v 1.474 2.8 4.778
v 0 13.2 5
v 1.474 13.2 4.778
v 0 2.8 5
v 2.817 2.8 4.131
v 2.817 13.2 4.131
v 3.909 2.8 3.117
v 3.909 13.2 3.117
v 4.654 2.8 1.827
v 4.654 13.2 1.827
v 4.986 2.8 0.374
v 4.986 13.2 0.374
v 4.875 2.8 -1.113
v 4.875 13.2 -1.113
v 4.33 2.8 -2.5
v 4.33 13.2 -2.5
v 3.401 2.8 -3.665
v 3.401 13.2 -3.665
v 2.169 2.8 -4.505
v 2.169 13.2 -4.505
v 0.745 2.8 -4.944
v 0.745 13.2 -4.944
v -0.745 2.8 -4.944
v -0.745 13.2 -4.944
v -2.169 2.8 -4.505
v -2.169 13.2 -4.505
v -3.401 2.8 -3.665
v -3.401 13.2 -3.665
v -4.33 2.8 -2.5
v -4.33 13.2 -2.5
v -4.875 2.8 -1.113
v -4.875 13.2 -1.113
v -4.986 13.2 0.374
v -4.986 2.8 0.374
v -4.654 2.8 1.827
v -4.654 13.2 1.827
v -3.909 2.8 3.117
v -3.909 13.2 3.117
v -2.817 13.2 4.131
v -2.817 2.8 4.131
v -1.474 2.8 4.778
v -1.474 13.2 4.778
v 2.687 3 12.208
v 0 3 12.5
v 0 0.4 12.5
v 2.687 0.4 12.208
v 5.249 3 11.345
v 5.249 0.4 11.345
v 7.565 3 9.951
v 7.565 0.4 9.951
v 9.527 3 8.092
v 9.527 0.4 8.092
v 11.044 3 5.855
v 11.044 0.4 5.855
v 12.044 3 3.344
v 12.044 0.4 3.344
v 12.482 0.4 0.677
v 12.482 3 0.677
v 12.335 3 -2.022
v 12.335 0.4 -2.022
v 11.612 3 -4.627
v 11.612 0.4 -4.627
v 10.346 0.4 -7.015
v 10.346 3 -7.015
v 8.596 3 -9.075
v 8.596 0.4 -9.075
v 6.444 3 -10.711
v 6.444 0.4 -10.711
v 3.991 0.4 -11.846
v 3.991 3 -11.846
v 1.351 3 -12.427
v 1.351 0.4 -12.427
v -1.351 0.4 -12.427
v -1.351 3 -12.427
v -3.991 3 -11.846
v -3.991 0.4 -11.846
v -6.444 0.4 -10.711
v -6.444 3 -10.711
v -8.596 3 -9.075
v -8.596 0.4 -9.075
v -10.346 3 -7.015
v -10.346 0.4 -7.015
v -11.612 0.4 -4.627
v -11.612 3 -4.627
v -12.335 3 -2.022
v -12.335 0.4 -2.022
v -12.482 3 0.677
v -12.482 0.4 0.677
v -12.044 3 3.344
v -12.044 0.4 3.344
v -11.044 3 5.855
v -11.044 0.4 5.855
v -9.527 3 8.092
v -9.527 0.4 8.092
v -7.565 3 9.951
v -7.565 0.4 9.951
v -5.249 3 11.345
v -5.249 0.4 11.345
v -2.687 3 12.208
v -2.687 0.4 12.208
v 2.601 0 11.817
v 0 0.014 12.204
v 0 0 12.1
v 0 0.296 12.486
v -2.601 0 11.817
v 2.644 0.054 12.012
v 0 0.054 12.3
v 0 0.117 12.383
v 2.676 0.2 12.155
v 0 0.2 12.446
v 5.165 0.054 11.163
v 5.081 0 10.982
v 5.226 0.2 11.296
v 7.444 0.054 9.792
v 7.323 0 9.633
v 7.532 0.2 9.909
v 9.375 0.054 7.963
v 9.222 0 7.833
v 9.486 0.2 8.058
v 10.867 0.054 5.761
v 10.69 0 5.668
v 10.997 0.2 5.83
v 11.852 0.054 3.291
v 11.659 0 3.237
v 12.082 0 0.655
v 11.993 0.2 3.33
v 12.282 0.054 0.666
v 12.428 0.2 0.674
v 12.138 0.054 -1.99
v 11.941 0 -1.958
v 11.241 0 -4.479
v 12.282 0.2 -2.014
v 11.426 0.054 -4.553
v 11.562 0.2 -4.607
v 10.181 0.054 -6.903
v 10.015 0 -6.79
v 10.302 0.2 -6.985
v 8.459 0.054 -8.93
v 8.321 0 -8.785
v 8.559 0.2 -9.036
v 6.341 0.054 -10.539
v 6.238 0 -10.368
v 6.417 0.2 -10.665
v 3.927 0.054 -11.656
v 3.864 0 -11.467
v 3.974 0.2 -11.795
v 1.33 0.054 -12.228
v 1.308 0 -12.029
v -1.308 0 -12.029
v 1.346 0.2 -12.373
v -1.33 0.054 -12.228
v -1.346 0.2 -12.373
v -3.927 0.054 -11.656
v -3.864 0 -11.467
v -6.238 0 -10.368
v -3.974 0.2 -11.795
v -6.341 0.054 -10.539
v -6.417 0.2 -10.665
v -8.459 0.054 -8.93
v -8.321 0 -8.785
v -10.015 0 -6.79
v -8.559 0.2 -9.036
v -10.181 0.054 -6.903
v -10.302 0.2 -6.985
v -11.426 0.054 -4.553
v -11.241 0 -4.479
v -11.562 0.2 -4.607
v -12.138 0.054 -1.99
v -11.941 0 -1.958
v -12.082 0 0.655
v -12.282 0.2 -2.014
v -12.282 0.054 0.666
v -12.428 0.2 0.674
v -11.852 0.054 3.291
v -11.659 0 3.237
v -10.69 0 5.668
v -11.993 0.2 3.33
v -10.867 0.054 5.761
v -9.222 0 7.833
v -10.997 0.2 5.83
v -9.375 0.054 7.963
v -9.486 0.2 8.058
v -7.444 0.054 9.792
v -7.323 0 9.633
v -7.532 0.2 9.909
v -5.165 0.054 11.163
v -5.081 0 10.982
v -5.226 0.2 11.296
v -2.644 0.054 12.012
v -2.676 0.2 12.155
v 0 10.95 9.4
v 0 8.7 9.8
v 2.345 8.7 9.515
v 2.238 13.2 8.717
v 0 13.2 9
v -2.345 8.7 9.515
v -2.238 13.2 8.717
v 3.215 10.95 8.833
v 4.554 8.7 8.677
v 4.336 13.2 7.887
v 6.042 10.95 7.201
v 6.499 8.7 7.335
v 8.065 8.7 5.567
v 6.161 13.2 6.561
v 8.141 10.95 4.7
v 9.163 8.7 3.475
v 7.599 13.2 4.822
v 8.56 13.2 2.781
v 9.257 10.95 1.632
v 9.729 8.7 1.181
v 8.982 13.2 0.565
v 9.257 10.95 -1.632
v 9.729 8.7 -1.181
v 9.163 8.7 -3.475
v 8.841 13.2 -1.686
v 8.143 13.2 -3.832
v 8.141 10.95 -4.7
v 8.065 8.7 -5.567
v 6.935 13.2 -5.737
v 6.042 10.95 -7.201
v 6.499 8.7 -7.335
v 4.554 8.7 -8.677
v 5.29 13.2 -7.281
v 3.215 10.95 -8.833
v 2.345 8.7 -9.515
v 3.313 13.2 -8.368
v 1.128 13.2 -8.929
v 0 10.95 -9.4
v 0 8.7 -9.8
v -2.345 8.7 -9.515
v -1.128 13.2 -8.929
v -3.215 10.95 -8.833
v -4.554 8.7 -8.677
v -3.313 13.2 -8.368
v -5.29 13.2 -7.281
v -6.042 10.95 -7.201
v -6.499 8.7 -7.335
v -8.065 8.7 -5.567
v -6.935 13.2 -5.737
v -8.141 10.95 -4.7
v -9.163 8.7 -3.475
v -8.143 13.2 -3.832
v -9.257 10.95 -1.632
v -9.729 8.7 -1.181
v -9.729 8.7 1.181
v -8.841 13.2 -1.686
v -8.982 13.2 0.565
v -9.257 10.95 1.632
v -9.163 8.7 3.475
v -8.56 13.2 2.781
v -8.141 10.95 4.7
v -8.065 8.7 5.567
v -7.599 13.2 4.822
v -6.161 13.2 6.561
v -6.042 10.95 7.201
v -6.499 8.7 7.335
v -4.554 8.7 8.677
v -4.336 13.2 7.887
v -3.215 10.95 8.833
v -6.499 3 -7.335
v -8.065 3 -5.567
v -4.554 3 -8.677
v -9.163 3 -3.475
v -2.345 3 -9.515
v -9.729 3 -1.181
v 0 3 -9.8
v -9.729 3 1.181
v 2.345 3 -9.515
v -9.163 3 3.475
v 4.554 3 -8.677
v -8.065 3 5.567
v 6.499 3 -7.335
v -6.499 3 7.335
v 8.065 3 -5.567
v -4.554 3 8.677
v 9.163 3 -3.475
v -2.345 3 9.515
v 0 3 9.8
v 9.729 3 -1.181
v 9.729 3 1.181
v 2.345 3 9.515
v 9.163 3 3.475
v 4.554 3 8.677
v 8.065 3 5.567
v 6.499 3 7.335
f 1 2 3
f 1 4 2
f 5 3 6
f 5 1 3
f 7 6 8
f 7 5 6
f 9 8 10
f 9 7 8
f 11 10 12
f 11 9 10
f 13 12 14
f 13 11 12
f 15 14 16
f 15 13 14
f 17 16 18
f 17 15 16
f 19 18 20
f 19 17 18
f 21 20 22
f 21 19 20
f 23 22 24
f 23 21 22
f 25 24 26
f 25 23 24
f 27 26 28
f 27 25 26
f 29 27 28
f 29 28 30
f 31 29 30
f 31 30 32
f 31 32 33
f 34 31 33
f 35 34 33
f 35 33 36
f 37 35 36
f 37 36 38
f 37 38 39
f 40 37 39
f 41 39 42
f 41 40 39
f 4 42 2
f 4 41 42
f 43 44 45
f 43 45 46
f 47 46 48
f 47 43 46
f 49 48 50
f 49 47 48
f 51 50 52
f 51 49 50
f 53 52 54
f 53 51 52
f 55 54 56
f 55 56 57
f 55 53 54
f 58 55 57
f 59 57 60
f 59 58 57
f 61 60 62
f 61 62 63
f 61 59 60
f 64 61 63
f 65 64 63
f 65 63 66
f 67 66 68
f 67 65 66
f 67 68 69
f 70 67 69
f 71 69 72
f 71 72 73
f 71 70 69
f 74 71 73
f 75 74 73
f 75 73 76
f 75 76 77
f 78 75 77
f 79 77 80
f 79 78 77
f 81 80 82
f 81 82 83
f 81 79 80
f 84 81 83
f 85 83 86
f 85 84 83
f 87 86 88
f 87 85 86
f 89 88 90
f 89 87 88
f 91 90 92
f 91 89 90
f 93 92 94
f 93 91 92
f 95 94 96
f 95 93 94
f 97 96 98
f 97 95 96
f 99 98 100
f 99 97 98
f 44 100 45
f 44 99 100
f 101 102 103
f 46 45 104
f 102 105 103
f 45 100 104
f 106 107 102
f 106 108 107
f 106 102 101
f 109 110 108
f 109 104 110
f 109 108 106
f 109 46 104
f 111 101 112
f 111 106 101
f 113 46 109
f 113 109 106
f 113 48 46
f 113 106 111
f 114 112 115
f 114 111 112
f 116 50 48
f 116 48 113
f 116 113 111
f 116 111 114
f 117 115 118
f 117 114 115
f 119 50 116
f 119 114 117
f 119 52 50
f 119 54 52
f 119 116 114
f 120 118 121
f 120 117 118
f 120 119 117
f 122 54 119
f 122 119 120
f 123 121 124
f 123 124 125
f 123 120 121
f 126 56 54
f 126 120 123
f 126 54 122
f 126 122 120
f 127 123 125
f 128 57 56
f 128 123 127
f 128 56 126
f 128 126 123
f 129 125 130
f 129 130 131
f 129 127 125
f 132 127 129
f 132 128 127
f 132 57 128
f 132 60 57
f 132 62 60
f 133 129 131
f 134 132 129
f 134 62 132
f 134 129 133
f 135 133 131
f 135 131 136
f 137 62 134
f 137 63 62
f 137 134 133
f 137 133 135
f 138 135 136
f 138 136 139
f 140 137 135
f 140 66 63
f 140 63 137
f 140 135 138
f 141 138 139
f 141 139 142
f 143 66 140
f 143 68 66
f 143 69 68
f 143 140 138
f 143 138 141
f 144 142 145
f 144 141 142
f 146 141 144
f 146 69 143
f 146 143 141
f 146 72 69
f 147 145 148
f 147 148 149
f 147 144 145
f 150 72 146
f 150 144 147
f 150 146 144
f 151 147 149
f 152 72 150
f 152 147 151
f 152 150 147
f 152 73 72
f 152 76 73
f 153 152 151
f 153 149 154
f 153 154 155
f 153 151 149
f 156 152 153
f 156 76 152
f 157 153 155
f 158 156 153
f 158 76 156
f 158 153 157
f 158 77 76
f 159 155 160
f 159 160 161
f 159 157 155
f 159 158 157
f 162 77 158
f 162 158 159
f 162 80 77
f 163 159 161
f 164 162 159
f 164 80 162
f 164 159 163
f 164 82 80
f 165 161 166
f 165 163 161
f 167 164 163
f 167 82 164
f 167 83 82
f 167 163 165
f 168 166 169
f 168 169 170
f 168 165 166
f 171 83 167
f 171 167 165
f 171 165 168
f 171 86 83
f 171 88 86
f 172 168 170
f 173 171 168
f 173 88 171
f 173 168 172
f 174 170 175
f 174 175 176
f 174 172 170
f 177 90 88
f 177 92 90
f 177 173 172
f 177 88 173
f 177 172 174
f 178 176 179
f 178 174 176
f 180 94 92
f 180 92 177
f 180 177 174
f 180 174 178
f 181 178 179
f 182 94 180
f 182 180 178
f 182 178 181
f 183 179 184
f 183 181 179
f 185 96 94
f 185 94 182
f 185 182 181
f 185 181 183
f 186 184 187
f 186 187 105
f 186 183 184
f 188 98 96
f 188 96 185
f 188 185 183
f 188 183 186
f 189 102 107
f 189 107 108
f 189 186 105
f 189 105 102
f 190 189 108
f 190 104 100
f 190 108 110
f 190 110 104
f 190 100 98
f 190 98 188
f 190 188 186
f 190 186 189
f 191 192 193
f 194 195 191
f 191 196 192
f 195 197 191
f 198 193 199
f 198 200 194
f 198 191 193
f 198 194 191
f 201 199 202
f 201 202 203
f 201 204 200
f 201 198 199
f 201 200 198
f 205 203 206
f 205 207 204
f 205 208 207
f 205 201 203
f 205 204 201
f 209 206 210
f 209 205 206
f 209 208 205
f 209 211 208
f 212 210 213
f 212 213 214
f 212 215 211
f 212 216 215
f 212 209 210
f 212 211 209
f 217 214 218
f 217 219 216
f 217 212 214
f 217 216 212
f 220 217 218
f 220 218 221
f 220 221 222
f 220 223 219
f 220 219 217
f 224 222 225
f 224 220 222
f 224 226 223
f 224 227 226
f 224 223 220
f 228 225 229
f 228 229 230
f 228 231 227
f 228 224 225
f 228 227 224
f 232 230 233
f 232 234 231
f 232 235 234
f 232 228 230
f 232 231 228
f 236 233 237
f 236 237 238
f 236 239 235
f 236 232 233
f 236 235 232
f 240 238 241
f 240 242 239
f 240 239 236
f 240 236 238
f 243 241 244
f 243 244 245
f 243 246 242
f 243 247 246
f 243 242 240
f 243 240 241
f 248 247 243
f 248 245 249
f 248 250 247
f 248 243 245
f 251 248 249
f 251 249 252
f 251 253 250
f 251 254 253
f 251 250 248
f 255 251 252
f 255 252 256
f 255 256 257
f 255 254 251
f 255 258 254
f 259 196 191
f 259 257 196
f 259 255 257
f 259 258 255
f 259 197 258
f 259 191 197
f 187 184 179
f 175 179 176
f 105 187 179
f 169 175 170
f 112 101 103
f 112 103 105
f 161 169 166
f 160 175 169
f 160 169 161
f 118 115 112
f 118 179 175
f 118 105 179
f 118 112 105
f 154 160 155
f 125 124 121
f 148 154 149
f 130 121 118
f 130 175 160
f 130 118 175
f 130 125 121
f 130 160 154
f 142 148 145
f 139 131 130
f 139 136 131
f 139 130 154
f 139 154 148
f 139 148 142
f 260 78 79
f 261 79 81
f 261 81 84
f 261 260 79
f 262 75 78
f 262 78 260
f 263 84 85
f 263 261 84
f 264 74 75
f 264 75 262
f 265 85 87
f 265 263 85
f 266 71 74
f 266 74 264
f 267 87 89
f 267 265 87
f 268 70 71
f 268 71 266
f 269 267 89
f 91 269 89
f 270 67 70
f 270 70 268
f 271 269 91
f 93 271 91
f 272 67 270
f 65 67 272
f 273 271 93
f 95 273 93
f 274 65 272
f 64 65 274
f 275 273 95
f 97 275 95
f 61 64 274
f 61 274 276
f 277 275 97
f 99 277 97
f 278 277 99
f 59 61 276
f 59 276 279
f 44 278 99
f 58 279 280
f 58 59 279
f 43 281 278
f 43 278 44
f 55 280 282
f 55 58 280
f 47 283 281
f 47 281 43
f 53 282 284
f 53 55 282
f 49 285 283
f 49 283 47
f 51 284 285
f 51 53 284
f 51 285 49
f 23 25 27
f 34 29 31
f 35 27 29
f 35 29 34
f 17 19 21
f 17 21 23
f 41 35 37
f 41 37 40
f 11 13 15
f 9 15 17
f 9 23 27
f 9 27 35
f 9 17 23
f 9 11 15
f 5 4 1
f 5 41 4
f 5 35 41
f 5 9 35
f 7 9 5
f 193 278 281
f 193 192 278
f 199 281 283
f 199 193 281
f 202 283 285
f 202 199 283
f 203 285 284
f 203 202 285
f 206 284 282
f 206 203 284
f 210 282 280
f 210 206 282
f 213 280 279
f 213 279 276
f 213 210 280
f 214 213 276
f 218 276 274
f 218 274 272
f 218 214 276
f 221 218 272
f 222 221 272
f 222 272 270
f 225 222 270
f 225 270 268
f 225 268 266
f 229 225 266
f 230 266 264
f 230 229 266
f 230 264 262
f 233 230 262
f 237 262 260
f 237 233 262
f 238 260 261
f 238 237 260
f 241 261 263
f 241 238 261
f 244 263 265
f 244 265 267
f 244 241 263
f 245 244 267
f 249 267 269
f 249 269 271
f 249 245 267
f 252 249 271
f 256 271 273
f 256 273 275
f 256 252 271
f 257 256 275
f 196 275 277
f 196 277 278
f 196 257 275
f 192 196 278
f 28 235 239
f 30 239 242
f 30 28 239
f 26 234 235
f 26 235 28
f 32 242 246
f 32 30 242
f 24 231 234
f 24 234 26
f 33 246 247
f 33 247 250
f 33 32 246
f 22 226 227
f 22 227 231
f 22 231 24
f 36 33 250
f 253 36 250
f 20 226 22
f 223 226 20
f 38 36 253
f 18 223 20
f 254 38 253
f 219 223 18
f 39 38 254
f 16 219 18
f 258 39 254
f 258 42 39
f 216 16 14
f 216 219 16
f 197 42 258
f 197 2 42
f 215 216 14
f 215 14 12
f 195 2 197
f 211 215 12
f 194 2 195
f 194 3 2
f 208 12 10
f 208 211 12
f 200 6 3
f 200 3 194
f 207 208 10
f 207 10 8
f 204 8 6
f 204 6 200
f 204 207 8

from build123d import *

# Parameters (mm, degrees)
FILLET1_R = 0.4


with BuildPart() as part:
    # Sketch1 → Revolve1 (revolve)
    with BuildSketch(Plane(origin=(0, 0, 0), x_dir=(0, 0, -1), z_dir=(1, 0, 0))):
        Polygon((0, 0), (-12.5, 0), (-12.5, 3), (-9.8, 3), (-9.8, 8.7), (-9, 13.2), (-5, 13.2), (-5, 2.8), (0, 2.8), align=None)
    revolve(axis=Axis((0, 0, 0), (0, 1, 0)))

    # Fillet1
    fillet1_edges = [part.edges().sort_by_distance(p)[0] for p in [
        (0, 0, -12.5),
    ]]
    fillet(fillet1_edges, radius=FILLET1_R)


solid = part.part
